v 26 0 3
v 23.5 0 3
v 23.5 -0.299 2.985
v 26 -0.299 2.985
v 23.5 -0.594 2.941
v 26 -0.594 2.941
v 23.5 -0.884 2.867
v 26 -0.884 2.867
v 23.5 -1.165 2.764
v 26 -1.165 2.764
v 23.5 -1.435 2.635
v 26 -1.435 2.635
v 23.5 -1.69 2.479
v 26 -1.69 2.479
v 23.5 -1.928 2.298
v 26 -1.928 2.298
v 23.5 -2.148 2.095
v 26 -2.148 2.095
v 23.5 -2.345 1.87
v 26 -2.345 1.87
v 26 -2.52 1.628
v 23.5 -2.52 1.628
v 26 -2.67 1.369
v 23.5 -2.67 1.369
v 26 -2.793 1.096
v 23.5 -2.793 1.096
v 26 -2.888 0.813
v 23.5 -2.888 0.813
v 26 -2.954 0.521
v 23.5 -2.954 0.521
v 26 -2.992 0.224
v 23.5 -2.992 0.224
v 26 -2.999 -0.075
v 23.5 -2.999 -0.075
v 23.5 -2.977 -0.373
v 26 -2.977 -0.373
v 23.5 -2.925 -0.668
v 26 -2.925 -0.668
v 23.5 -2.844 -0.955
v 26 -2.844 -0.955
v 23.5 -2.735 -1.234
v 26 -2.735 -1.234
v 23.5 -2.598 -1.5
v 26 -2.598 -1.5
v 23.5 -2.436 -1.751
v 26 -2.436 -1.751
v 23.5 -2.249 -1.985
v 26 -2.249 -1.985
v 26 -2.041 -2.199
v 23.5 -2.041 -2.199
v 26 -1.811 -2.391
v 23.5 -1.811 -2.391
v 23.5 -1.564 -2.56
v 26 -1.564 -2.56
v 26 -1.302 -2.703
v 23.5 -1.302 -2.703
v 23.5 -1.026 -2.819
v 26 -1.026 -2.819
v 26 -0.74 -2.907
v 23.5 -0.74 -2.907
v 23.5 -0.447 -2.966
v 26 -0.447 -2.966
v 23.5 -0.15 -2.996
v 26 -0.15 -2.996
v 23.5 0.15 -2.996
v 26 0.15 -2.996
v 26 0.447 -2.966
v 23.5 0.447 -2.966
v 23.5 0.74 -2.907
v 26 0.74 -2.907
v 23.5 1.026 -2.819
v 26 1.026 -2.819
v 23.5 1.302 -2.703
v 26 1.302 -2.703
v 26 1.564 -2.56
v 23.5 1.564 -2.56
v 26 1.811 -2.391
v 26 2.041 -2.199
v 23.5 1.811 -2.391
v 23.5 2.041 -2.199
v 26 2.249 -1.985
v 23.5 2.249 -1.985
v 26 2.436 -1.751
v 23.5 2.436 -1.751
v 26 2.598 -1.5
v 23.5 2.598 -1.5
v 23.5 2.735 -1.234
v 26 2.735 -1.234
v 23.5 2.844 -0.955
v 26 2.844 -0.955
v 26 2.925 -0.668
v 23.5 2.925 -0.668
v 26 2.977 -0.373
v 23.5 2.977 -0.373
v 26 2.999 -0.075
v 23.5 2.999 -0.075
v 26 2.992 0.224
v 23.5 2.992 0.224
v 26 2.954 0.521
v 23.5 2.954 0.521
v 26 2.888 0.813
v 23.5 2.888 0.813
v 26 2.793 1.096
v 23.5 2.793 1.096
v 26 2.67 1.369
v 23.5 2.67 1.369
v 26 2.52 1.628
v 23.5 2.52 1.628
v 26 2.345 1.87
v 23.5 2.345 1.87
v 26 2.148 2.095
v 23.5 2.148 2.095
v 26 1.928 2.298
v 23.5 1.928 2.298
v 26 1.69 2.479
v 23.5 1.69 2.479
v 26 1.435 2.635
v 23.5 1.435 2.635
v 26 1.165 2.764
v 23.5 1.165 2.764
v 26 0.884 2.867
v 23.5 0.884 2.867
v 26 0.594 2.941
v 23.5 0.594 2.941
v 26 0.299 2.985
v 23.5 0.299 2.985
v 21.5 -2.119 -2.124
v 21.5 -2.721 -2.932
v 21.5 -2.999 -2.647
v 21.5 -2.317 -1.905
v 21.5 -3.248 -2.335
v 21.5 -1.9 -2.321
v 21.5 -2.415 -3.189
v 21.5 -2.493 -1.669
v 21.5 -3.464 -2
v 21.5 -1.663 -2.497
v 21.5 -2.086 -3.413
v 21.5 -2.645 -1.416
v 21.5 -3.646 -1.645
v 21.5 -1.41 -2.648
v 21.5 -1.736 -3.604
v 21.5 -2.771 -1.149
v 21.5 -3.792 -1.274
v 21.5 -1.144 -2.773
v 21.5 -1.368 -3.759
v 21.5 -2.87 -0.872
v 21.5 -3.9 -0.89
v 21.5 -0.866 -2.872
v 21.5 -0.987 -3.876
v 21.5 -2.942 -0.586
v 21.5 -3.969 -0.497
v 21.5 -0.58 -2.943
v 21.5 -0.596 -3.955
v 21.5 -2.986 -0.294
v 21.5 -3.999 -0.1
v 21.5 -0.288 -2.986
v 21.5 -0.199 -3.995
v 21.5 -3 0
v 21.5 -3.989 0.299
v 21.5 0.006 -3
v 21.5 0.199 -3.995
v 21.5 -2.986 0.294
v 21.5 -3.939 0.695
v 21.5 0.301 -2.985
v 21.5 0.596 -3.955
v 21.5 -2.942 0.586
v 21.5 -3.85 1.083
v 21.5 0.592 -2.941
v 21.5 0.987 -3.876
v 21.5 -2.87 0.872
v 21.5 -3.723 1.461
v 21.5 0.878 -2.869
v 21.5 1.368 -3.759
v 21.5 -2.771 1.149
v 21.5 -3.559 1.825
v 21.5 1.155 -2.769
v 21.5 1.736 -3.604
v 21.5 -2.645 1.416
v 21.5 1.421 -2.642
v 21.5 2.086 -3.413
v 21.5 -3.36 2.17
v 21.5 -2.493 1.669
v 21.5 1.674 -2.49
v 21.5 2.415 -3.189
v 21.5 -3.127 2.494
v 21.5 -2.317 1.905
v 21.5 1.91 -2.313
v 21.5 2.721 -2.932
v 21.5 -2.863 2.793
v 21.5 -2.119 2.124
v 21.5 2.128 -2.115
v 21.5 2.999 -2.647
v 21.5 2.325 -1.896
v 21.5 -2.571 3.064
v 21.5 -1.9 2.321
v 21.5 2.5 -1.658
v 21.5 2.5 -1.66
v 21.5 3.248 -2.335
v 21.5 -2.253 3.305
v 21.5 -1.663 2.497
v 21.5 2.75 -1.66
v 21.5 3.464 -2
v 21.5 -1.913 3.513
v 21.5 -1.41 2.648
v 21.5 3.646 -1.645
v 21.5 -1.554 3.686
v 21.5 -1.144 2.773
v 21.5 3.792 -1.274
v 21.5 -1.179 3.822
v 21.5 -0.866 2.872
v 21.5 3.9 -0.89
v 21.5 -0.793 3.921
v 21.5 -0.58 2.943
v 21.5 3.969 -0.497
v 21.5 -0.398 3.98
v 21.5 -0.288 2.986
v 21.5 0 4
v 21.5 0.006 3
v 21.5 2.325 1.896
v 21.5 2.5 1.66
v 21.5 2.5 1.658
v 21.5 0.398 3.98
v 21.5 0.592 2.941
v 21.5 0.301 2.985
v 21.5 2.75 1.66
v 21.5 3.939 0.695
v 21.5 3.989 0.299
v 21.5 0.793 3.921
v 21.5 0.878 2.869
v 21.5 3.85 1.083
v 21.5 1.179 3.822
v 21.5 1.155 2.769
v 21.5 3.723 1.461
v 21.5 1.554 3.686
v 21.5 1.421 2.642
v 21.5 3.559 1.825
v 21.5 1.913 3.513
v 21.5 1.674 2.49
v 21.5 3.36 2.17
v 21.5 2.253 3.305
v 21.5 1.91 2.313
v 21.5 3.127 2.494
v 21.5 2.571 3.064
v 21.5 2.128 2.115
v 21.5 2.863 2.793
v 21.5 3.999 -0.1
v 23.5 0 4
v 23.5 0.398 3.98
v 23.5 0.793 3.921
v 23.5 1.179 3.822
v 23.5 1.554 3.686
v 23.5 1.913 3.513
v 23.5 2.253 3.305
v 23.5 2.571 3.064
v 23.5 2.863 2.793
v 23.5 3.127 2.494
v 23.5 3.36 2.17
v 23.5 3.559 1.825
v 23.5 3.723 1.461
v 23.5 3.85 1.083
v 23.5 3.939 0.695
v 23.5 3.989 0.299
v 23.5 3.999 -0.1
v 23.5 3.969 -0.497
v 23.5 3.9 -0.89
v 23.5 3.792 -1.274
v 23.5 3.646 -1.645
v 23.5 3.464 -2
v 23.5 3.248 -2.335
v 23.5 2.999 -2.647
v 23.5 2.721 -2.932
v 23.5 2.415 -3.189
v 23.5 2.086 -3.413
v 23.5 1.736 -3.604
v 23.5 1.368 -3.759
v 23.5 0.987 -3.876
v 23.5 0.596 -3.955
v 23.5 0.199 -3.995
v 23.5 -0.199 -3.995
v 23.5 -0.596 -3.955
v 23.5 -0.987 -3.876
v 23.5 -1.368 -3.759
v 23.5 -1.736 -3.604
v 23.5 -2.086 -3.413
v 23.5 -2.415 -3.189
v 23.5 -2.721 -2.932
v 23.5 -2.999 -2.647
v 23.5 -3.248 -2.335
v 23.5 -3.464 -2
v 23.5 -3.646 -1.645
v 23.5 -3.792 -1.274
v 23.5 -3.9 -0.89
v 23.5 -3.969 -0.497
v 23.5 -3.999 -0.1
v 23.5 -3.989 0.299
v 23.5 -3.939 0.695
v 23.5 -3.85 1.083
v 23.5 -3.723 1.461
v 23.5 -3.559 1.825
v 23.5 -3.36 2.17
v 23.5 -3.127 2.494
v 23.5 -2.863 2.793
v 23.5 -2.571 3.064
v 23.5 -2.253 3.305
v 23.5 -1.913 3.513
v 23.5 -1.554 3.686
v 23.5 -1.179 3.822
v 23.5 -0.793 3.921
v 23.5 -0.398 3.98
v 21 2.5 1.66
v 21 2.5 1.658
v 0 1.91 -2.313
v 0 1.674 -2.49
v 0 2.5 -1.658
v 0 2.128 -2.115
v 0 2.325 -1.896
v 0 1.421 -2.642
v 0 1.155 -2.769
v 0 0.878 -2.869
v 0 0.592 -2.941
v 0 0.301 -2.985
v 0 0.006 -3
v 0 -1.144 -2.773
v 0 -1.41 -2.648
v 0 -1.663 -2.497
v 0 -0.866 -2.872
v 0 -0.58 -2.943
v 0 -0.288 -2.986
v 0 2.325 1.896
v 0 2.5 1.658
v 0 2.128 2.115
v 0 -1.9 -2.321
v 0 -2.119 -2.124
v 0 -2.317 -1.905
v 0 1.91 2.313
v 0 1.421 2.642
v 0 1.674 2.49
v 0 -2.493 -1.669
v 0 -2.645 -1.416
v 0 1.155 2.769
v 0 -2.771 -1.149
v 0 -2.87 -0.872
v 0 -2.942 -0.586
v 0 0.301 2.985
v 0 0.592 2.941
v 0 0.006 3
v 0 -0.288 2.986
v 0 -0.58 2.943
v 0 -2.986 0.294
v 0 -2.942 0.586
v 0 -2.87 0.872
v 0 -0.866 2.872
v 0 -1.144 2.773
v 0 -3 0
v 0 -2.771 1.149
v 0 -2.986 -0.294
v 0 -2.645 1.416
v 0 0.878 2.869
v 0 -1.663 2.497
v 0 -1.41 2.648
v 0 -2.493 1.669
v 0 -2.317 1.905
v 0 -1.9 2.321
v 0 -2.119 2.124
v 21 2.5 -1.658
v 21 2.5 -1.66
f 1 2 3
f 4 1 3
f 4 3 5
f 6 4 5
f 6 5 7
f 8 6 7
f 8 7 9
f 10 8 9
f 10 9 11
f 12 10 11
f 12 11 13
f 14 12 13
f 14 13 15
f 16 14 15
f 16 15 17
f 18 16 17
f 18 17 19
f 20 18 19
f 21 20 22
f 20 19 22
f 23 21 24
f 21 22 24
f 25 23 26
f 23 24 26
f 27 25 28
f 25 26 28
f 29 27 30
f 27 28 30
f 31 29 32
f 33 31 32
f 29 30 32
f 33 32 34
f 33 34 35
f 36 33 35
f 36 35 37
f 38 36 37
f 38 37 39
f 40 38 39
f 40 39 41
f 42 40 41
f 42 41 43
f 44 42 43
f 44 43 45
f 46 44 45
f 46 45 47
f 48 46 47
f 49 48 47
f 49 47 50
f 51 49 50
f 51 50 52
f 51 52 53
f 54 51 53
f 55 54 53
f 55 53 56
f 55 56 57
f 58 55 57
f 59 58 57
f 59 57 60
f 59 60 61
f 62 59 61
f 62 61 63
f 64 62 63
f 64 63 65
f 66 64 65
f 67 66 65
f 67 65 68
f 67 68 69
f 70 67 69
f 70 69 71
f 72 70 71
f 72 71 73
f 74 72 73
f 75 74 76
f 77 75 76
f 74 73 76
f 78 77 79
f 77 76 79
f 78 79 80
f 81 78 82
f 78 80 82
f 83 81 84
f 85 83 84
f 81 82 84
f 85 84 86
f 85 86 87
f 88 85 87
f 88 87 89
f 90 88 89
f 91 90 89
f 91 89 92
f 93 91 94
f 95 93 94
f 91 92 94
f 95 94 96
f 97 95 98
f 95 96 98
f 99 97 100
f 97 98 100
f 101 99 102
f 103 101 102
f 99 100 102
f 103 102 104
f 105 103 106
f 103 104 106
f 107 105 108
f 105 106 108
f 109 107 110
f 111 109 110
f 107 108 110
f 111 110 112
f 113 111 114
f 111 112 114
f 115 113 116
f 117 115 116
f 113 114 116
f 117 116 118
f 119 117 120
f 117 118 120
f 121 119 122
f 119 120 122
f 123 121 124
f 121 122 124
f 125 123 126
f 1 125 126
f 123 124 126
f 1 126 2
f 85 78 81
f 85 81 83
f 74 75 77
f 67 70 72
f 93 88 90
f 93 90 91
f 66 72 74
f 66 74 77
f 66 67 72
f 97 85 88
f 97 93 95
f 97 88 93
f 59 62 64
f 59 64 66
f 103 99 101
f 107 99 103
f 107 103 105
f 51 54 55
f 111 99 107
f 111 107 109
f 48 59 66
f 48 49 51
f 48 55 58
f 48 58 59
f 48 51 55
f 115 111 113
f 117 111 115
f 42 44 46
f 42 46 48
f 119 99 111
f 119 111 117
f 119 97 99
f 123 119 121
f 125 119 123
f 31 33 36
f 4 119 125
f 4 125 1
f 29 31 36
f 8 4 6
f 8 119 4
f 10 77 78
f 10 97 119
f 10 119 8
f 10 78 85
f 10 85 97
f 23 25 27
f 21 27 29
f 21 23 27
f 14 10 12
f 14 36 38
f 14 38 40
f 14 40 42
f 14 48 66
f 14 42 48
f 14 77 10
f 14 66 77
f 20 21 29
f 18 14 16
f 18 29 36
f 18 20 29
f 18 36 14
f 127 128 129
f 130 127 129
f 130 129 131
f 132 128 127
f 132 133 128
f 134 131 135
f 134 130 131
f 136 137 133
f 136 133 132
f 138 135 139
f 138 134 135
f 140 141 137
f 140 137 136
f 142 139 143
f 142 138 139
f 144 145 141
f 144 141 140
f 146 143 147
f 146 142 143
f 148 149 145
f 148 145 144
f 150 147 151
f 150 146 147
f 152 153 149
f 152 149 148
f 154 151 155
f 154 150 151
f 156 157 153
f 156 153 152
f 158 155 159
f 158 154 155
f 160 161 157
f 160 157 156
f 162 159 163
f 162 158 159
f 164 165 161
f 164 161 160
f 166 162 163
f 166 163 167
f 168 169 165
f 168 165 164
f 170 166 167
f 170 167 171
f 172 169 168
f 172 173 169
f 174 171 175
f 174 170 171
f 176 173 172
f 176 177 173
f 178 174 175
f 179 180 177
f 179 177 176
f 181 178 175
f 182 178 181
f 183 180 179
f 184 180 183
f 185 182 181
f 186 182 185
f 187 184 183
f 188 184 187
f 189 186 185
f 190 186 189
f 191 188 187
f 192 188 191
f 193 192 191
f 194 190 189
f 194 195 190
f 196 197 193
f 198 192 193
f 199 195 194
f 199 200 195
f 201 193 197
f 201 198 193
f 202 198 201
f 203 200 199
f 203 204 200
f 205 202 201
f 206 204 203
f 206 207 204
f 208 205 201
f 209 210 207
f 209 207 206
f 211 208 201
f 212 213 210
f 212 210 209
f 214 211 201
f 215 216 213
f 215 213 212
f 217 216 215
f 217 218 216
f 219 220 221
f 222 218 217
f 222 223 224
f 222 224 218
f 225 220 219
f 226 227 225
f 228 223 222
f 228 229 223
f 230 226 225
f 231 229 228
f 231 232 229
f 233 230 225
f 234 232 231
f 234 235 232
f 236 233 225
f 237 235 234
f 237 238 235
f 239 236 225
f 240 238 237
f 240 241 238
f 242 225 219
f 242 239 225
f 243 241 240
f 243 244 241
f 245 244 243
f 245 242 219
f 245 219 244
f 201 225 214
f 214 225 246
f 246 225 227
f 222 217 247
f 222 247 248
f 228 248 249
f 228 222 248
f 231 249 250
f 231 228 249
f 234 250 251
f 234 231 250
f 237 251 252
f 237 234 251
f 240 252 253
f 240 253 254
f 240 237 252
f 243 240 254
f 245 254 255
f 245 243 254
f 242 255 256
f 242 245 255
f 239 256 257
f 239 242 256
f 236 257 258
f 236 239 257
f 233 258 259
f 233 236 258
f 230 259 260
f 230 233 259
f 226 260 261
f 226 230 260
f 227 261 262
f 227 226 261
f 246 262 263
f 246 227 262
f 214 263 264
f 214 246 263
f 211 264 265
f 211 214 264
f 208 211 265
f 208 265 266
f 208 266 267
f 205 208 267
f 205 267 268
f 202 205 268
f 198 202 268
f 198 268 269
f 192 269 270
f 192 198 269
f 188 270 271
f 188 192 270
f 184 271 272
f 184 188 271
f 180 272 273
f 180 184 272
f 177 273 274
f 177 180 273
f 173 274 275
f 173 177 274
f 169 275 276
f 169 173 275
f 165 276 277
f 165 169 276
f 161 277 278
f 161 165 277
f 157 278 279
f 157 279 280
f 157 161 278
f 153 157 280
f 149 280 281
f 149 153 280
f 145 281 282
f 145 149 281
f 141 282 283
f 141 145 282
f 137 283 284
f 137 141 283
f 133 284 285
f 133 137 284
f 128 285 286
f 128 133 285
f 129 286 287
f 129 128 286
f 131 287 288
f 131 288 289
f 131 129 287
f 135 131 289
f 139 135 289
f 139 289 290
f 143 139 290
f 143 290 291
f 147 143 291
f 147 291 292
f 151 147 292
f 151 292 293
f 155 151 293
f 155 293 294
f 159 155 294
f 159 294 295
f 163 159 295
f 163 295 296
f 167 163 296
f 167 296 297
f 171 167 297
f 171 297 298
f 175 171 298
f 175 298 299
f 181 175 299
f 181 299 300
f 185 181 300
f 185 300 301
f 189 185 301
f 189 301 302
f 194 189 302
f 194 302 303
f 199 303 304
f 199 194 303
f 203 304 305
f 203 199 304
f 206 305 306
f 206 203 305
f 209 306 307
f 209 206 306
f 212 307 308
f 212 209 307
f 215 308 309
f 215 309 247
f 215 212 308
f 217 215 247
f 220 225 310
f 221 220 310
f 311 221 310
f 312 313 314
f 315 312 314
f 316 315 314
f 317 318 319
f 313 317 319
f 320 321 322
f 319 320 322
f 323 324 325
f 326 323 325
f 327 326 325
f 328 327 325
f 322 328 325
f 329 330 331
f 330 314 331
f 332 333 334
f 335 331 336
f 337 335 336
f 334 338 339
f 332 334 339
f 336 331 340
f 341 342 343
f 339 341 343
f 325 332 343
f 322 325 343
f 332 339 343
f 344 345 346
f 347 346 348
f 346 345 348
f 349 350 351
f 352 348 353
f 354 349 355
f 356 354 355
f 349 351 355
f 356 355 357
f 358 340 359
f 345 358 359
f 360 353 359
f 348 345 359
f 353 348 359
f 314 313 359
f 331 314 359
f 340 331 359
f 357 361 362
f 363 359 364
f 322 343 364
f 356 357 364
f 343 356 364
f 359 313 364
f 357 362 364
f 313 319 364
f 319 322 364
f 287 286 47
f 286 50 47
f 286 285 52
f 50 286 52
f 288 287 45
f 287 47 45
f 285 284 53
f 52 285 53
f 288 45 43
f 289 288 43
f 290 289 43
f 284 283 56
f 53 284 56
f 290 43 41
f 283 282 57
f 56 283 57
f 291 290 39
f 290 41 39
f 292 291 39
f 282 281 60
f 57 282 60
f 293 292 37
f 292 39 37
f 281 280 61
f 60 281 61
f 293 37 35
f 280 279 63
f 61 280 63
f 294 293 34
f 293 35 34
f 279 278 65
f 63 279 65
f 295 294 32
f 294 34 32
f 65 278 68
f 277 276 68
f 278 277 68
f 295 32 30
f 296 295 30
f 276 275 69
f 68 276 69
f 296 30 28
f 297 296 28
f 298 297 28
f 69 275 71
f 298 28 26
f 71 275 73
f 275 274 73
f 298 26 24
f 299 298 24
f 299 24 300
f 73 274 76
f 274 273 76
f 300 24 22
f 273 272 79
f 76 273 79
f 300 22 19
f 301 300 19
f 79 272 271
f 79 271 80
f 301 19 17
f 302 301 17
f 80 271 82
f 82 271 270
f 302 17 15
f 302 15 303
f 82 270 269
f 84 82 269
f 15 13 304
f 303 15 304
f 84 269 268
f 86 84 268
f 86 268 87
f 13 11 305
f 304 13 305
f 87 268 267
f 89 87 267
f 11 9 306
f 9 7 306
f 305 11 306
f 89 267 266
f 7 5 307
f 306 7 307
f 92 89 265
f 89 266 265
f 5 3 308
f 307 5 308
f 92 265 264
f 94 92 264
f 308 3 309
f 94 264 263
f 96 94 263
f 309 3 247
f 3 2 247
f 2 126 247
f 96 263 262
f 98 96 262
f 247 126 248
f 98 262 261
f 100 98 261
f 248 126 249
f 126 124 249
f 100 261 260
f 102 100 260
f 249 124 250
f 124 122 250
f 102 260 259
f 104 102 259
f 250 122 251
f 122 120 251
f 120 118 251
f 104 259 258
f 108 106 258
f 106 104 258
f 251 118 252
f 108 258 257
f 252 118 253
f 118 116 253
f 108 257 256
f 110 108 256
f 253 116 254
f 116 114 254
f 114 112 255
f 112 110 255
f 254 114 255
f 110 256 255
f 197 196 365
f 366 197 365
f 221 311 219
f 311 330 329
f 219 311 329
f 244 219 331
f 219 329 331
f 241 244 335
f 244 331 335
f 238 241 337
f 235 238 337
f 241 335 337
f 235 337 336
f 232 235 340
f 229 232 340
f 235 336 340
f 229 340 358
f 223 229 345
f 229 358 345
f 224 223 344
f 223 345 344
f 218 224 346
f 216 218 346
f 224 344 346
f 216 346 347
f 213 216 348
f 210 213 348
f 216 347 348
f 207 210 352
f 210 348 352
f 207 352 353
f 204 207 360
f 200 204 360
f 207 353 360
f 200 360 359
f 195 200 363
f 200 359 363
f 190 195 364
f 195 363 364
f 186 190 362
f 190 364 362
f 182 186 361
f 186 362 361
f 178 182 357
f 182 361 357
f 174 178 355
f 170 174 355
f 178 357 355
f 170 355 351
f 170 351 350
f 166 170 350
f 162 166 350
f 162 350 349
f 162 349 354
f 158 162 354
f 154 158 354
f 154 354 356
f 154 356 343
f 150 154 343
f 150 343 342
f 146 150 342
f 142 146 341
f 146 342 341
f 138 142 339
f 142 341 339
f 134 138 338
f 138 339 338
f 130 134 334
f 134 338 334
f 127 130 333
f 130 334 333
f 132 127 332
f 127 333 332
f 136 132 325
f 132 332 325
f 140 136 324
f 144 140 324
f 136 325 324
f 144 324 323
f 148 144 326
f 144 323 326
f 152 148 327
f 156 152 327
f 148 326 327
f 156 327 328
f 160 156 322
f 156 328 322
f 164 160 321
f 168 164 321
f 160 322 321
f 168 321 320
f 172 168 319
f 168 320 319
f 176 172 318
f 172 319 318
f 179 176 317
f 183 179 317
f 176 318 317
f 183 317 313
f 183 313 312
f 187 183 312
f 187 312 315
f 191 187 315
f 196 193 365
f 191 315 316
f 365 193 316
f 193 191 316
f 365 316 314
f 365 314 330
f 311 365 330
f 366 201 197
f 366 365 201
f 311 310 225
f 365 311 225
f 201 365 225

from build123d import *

# Parameters (mm, degrees)
SKETCH1_R           = 3
BOSS_EXTRUDE1_DEPTH = 26
CUT_EXTRUDE1_DEPTH  = 21.5
SKETCH3_R           = 4
SKETCH3_R_2         = 3
BOSS_EXTRUDE2_DEPTH = 2
BOSS_EXTRUDE3_DEPTH = 1.66


with BuildPart() as part:
    # Sketch1 → Boss-Extrude1 (new body)
    with BuildSketch(Plane(origin=(0, 0, 0), x_dir=(0, 0, -1), z_dir=(1, 0, 0))):
        with Locations(Location((0, 0, 0), (0, 0, 180))):
            Circle(SKETCH1_R)
    extrude(amount=BOSS_EXTRUDE1_DEPTH)

    # Sketch2 → Cut-Extrude1 (cut)
    with BuildSketch(Plane.ZY):
        with BuildLine():
            Line((-1.658312395, 2.5), (1.658312395, 2.5))
            ThreePointArc((1.658312395, 2.5), (0, 3), (-1.658312395, 2.5))
        make_face()
    extrude(amount=-CUT_EXTRUDE1_DEPTH, mode=Mode.SUBTRACT)

    # Sketch3 → Boss-Extrude2 (add)
    with BuildSketch(Plane.ZY.offset(-21.5)):
        Circle(SKETCH3_R)
        Circle(SKETCH3_R_2, mode=Mode.SUBTRACT)
    extrude(amount=-BOSS_EXTRUDE2_DEPTH)

    # Sketch4 → Boss-Extrude3 (add, symmetric)
    with BuildSketch(Plane.XY):
        Polygon((21, 2.5), (21.5, 2.75), (21.5, 2.5), align=None)
    extrude(amount=BOSS_EXTRUDE3_DEPTH, both=True)


solid = part.part
